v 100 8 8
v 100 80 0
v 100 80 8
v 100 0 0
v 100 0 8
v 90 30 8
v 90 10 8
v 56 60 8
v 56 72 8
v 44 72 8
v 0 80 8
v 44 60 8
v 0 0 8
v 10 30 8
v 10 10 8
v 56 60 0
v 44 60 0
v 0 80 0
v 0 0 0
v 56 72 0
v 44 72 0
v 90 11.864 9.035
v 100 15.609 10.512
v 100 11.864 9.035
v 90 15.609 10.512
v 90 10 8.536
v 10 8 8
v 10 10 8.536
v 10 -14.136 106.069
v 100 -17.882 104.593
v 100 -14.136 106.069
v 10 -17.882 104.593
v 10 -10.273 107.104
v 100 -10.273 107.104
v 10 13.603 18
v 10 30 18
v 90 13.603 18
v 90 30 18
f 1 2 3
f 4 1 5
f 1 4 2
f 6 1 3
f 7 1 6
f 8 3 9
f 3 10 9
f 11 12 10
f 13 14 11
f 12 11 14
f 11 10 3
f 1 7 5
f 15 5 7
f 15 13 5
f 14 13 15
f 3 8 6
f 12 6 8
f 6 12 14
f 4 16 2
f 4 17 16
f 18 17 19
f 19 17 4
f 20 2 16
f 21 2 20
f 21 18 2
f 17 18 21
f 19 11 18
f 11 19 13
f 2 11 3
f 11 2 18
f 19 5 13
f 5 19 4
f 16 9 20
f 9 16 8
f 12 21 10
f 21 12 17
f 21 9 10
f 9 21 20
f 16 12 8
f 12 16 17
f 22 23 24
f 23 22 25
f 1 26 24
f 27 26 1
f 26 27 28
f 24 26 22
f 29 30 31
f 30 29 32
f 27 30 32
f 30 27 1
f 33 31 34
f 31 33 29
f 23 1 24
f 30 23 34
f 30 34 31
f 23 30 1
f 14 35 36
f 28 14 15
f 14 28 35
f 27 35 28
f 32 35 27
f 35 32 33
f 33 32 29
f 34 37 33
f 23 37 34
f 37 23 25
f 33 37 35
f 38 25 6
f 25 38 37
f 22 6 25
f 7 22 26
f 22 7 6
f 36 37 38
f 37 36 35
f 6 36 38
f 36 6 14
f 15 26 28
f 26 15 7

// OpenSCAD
// ==============================
// Parameters
// ==============================
phone_width = 80;           // Standard phone width
phone_thickness = 10;       // Typical phone thickness
stand_height = 100;         // Overall height of stand
base_depth = 80;            // Depth of base platform
base_width = phone_width + 20;  // Add clearance on sides
wall_thickness = 2;         // Minimum wall thickness (>=1.5mm)
tilt_angle = 15;            // Tilt angle of support
cable_slot_width = 12;      // Slot for charging cable
cable_slot_height = 8;      // Height of slot opening
slot_offset = 20;           // Distance from rear edge of base

// ==============================
// Modules
// ==============================

// Main inclined back support
module back_support() {
    tilt_radians = tilt_angle * PI / 180;
    support_thickness = wall_thickness * 2;
    support_height = stand_height;
    support_width = phone_width + 10;
    
    // Rectangular plate for phone rest
    hull() {
        translate([0, 0, 0])
            cube([support_width, support_thickness, support_height], center=false);
        translate([0, support_thickness, support_height*sin(tilt_radians)])
            cube([support_width, support_thickness, support_height], center=false);
    }
}

// Lower lip that holds phone bottom
module bottom_shelf() {
    shelf_depth = 20;
    shelf_height = 10;
    translate([(base_width - phone_width)/2, 0, 0])
        cube([phone_width, shelf_depth, shelf_height]);
}

// Base platform with cable slot cutout
module base_platform() {
    difference() {
        cube([base_width, base_depth, wall_thickness * 4]);
        // Cable slot
        translate([(base_width - cable_slot_width)/2, base_depth - slot_offset, -1])
            cube([cable_slot_width, wall_thickness*6, cable_slot_height + 2]);
    }
}

// ==============================
// Assembly
// ==============================
module phone_stand() {
    base_platform();
    // Position back support at 15° tilt
    translate([(base_width - phone_width)/2, wall_thickness * 4, wall_thickness*4])
        rotate([tilt_angle, 0, 0])
            back_support();
    // Add the bottom shelf in front of the support
    translate([0, 10, wall_thickness*4])
        bottom_shelf();
}

// ==============================
// Render
// ==============================
phone_stand();
